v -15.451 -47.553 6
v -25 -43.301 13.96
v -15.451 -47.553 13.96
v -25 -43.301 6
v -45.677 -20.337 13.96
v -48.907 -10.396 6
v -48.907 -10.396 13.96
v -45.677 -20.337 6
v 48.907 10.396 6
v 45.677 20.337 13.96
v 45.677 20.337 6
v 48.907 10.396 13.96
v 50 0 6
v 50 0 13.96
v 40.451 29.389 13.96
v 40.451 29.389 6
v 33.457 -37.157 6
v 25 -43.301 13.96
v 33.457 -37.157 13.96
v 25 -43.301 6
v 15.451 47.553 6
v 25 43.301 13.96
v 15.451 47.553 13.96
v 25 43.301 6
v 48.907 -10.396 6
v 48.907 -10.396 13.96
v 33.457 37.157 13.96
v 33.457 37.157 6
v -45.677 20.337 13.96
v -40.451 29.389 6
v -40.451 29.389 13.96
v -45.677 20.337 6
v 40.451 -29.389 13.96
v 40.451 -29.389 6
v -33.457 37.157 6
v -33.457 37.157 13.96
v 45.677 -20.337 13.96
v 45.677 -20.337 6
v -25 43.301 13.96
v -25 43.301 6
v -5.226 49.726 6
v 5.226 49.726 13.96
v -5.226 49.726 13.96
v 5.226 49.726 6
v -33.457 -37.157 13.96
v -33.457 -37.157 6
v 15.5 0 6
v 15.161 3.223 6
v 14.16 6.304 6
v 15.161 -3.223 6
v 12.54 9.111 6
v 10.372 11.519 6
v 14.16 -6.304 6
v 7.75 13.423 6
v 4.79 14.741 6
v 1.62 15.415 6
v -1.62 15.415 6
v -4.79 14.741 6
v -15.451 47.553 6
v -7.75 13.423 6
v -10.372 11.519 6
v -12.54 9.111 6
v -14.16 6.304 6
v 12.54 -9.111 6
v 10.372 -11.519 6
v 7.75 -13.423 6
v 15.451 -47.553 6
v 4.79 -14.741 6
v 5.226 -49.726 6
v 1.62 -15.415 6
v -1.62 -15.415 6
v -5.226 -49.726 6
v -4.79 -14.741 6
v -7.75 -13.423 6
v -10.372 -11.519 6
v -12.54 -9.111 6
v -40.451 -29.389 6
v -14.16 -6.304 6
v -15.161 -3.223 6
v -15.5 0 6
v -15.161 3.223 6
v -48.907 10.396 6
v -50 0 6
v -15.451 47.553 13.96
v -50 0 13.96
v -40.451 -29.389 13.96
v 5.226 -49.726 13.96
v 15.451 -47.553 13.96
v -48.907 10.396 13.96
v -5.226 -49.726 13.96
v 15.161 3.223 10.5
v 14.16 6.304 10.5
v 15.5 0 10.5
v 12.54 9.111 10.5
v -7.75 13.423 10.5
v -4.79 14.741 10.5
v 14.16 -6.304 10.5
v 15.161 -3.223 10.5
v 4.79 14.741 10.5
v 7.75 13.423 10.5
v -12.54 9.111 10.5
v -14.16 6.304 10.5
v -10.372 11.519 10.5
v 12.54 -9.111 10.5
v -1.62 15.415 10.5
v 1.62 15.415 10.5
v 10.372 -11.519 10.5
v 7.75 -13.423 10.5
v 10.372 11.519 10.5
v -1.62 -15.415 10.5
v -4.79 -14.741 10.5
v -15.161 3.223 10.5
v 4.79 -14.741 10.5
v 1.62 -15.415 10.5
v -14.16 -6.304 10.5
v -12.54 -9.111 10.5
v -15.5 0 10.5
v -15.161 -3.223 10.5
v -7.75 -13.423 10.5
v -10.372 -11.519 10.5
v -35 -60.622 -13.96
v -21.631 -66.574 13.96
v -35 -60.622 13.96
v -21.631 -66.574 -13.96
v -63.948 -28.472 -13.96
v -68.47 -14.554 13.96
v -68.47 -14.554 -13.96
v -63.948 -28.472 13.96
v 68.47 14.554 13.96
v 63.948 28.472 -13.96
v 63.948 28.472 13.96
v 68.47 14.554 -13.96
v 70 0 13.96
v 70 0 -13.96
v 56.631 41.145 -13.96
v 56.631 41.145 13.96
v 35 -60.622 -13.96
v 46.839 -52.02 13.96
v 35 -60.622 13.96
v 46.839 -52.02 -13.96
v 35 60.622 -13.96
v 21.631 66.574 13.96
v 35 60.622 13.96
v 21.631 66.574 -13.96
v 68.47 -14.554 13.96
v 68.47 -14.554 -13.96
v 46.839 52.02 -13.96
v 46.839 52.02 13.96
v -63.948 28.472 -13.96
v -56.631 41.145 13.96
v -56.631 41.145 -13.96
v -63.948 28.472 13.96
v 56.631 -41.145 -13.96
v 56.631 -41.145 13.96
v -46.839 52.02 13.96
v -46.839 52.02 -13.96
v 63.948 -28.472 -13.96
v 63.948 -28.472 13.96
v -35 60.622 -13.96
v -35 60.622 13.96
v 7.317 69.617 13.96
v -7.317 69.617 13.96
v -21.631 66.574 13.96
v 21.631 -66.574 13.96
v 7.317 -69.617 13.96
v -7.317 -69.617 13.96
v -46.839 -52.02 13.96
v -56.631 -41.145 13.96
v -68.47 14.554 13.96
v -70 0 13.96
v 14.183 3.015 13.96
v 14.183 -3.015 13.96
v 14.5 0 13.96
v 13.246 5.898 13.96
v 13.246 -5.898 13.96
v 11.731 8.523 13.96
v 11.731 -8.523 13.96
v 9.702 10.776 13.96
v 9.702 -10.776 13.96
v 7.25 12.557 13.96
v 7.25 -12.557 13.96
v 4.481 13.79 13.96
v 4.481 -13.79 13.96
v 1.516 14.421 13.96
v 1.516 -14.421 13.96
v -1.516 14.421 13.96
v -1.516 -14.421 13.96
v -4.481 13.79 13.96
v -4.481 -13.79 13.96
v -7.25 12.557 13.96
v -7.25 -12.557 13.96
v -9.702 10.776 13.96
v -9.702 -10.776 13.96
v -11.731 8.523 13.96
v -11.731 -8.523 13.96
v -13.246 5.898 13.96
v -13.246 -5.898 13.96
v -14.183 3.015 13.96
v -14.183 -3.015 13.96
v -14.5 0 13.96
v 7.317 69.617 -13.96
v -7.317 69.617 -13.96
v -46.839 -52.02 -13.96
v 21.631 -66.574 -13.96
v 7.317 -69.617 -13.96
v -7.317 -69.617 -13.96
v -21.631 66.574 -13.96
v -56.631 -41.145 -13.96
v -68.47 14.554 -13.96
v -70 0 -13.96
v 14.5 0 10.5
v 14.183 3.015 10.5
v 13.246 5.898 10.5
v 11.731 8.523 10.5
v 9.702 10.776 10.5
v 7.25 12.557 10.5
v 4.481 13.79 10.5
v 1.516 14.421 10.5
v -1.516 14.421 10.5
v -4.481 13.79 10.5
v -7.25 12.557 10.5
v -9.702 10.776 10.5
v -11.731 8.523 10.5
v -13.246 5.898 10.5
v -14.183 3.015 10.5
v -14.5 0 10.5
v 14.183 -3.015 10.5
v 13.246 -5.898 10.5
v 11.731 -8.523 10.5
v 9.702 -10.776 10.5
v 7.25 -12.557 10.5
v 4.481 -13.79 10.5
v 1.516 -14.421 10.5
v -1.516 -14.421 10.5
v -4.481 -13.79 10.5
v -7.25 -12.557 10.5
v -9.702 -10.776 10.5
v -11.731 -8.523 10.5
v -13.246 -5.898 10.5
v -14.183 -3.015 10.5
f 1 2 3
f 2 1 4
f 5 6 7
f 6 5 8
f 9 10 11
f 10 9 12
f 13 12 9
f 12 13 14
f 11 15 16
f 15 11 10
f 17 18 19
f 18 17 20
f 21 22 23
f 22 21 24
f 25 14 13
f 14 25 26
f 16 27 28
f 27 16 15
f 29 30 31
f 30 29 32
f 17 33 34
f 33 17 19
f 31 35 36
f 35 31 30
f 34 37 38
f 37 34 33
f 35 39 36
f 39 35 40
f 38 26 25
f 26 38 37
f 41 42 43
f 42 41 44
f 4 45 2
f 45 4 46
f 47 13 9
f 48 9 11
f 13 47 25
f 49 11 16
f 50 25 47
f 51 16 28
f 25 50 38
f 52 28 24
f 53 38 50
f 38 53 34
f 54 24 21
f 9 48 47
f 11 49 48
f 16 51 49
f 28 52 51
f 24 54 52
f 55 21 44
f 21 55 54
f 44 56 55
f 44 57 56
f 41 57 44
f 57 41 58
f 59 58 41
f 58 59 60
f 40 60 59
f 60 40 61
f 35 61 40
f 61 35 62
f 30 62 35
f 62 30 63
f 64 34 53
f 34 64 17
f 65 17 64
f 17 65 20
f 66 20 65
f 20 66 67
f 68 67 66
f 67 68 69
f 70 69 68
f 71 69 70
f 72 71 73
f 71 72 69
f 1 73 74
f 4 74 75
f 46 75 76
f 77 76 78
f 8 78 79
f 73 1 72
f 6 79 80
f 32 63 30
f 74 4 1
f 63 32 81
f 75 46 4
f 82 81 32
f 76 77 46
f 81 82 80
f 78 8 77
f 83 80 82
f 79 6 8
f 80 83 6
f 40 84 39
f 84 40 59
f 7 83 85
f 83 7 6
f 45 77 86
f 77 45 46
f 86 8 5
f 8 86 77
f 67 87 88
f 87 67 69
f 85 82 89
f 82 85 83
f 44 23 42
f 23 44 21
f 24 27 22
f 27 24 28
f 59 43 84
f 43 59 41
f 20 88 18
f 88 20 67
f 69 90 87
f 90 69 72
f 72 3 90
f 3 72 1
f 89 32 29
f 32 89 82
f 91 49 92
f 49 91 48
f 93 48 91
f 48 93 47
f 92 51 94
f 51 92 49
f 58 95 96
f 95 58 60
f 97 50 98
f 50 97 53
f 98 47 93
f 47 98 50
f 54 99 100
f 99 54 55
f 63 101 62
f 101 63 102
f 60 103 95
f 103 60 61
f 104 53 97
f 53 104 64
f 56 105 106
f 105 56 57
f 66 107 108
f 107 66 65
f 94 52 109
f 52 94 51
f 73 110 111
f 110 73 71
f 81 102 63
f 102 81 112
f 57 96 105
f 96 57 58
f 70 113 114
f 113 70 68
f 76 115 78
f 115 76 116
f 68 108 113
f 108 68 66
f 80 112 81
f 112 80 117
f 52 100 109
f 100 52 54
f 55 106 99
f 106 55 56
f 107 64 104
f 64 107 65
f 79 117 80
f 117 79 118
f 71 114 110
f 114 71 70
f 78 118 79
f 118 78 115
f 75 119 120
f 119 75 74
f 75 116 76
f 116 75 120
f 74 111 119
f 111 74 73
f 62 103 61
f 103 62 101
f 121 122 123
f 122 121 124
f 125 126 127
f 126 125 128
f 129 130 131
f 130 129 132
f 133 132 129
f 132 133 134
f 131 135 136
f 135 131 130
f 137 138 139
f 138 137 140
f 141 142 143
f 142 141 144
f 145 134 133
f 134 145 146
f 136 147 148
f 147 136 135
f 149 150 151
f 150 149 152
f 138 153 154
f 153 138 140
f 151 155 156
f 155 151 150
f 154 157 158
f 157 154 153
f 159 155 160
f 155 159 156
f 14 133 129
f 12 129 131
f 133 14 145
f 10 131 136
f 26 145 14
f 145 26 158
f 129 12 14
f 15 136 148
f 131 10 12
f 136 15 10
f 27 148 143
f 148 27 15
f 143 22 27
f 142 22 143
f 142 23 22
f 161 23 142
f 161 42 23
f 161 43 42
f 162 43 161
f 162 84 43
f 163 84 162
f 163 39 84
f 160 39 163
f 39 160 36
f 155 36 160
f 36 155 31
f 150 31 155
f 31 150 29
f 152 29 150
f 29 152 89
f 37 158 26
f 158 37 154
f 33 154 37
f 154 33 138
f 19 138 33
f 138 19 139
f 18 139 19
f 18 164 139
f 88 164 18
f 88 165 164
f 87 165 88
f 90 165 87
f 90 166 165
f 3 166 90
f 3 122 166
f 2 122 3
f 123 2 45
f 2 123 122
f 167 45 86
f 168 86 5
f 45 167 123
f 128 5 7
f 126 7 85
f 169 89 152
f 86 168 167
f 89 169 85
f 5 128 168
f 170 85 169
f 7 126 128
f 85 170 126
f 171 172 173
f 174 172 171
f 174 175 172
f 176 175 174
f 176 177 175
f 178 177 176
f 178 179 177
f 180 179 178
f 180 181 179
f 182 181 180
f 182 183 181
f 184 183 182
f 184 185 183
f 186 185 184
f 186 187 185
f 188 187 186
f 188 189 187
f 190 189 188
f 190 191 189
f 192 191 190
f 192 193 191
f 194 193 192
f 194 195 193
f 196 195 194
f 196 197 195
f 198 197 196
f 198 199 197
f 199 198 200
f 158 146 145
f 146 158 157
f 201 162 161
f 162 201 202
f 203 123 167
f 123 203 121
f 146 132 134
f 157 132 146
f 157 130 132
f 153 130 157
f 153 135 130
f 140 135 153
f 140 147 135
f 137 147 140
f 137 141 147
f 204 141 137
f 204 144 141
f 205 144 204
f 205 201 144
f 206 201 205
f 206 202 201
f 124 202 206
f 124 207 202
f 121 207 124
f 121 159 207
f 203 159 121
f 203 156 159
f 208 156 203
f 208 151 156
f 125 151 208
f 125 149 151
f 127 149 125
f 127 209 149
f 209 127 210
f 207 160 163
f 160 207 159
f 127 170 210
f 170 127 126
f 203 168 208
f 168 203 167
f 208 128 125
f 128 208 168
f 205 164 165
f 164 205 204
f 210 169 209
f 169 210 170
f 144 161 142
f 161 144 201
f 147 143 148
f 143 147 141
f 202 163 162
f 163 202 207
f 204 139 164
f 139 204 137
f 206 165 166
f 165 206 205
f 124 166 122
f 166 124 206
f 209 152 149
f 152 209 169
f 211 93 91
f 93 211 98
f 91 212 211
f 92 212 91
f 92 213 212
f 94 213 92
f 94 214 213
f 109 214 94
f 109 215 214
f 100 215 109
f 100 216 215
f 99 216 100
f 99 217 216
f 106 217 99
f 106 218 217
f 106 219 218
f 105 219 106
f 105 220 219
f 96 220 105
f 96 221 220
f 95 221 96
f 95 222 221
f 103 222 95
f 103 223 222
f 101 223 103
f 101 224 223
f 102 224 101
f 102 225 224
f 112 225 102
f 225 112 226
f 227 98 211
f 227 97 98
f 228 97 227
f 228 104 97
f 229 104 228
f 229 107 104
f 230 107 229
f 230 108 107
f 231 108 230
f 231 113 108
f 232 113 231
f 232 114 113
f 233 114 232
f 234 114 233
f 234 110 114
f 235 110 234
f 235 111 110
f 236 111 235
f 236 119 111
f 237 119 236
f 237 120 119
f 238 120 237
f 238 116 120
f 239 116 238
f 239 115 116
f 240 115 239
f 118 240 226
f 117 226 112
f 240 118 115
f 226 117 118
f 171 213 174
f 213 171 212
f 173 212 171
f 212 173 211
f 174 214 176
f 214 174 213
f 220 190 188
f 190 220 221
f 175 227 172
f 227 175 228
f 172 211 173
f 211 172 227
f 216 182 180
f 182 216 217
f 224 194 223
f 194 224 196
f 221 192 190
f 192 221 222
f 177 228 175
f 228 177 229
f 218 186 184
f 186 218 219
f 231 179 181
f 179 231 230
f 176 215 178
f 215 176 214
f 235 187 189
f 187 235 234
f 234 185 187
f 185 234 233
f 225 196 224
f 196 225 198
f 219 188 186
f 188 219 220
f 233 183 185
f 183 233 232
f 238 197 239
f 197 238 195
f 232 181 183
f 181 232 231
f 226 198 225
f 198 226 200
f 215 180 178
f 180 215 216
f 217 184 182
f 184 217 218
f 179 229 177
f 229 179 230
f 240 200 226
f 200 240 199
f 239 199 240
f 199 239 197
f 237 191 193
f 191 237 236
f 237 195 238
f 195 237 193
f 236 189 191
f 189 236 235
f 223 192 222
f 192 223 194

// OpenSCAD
 
difference()
  {
  difference()
    {
        cylinder(h=27.92, r1=70, r2=70,center=true);
        translate([0,0,20]) {
        difference()
            {
            cylinder(28,r1=50,r2=50,center=true);
            cylinder(60,r1=15.5,r2=15.5,center=true);   
            }
        }
}
   translate([0,0,30]) {
  difference()
 {
    cylinder(39,r1=44,r2=44,center=true);
    cylinder(60,r1=14.5,r2=14.5,center=true);   
 }
}
}




 
 
 
